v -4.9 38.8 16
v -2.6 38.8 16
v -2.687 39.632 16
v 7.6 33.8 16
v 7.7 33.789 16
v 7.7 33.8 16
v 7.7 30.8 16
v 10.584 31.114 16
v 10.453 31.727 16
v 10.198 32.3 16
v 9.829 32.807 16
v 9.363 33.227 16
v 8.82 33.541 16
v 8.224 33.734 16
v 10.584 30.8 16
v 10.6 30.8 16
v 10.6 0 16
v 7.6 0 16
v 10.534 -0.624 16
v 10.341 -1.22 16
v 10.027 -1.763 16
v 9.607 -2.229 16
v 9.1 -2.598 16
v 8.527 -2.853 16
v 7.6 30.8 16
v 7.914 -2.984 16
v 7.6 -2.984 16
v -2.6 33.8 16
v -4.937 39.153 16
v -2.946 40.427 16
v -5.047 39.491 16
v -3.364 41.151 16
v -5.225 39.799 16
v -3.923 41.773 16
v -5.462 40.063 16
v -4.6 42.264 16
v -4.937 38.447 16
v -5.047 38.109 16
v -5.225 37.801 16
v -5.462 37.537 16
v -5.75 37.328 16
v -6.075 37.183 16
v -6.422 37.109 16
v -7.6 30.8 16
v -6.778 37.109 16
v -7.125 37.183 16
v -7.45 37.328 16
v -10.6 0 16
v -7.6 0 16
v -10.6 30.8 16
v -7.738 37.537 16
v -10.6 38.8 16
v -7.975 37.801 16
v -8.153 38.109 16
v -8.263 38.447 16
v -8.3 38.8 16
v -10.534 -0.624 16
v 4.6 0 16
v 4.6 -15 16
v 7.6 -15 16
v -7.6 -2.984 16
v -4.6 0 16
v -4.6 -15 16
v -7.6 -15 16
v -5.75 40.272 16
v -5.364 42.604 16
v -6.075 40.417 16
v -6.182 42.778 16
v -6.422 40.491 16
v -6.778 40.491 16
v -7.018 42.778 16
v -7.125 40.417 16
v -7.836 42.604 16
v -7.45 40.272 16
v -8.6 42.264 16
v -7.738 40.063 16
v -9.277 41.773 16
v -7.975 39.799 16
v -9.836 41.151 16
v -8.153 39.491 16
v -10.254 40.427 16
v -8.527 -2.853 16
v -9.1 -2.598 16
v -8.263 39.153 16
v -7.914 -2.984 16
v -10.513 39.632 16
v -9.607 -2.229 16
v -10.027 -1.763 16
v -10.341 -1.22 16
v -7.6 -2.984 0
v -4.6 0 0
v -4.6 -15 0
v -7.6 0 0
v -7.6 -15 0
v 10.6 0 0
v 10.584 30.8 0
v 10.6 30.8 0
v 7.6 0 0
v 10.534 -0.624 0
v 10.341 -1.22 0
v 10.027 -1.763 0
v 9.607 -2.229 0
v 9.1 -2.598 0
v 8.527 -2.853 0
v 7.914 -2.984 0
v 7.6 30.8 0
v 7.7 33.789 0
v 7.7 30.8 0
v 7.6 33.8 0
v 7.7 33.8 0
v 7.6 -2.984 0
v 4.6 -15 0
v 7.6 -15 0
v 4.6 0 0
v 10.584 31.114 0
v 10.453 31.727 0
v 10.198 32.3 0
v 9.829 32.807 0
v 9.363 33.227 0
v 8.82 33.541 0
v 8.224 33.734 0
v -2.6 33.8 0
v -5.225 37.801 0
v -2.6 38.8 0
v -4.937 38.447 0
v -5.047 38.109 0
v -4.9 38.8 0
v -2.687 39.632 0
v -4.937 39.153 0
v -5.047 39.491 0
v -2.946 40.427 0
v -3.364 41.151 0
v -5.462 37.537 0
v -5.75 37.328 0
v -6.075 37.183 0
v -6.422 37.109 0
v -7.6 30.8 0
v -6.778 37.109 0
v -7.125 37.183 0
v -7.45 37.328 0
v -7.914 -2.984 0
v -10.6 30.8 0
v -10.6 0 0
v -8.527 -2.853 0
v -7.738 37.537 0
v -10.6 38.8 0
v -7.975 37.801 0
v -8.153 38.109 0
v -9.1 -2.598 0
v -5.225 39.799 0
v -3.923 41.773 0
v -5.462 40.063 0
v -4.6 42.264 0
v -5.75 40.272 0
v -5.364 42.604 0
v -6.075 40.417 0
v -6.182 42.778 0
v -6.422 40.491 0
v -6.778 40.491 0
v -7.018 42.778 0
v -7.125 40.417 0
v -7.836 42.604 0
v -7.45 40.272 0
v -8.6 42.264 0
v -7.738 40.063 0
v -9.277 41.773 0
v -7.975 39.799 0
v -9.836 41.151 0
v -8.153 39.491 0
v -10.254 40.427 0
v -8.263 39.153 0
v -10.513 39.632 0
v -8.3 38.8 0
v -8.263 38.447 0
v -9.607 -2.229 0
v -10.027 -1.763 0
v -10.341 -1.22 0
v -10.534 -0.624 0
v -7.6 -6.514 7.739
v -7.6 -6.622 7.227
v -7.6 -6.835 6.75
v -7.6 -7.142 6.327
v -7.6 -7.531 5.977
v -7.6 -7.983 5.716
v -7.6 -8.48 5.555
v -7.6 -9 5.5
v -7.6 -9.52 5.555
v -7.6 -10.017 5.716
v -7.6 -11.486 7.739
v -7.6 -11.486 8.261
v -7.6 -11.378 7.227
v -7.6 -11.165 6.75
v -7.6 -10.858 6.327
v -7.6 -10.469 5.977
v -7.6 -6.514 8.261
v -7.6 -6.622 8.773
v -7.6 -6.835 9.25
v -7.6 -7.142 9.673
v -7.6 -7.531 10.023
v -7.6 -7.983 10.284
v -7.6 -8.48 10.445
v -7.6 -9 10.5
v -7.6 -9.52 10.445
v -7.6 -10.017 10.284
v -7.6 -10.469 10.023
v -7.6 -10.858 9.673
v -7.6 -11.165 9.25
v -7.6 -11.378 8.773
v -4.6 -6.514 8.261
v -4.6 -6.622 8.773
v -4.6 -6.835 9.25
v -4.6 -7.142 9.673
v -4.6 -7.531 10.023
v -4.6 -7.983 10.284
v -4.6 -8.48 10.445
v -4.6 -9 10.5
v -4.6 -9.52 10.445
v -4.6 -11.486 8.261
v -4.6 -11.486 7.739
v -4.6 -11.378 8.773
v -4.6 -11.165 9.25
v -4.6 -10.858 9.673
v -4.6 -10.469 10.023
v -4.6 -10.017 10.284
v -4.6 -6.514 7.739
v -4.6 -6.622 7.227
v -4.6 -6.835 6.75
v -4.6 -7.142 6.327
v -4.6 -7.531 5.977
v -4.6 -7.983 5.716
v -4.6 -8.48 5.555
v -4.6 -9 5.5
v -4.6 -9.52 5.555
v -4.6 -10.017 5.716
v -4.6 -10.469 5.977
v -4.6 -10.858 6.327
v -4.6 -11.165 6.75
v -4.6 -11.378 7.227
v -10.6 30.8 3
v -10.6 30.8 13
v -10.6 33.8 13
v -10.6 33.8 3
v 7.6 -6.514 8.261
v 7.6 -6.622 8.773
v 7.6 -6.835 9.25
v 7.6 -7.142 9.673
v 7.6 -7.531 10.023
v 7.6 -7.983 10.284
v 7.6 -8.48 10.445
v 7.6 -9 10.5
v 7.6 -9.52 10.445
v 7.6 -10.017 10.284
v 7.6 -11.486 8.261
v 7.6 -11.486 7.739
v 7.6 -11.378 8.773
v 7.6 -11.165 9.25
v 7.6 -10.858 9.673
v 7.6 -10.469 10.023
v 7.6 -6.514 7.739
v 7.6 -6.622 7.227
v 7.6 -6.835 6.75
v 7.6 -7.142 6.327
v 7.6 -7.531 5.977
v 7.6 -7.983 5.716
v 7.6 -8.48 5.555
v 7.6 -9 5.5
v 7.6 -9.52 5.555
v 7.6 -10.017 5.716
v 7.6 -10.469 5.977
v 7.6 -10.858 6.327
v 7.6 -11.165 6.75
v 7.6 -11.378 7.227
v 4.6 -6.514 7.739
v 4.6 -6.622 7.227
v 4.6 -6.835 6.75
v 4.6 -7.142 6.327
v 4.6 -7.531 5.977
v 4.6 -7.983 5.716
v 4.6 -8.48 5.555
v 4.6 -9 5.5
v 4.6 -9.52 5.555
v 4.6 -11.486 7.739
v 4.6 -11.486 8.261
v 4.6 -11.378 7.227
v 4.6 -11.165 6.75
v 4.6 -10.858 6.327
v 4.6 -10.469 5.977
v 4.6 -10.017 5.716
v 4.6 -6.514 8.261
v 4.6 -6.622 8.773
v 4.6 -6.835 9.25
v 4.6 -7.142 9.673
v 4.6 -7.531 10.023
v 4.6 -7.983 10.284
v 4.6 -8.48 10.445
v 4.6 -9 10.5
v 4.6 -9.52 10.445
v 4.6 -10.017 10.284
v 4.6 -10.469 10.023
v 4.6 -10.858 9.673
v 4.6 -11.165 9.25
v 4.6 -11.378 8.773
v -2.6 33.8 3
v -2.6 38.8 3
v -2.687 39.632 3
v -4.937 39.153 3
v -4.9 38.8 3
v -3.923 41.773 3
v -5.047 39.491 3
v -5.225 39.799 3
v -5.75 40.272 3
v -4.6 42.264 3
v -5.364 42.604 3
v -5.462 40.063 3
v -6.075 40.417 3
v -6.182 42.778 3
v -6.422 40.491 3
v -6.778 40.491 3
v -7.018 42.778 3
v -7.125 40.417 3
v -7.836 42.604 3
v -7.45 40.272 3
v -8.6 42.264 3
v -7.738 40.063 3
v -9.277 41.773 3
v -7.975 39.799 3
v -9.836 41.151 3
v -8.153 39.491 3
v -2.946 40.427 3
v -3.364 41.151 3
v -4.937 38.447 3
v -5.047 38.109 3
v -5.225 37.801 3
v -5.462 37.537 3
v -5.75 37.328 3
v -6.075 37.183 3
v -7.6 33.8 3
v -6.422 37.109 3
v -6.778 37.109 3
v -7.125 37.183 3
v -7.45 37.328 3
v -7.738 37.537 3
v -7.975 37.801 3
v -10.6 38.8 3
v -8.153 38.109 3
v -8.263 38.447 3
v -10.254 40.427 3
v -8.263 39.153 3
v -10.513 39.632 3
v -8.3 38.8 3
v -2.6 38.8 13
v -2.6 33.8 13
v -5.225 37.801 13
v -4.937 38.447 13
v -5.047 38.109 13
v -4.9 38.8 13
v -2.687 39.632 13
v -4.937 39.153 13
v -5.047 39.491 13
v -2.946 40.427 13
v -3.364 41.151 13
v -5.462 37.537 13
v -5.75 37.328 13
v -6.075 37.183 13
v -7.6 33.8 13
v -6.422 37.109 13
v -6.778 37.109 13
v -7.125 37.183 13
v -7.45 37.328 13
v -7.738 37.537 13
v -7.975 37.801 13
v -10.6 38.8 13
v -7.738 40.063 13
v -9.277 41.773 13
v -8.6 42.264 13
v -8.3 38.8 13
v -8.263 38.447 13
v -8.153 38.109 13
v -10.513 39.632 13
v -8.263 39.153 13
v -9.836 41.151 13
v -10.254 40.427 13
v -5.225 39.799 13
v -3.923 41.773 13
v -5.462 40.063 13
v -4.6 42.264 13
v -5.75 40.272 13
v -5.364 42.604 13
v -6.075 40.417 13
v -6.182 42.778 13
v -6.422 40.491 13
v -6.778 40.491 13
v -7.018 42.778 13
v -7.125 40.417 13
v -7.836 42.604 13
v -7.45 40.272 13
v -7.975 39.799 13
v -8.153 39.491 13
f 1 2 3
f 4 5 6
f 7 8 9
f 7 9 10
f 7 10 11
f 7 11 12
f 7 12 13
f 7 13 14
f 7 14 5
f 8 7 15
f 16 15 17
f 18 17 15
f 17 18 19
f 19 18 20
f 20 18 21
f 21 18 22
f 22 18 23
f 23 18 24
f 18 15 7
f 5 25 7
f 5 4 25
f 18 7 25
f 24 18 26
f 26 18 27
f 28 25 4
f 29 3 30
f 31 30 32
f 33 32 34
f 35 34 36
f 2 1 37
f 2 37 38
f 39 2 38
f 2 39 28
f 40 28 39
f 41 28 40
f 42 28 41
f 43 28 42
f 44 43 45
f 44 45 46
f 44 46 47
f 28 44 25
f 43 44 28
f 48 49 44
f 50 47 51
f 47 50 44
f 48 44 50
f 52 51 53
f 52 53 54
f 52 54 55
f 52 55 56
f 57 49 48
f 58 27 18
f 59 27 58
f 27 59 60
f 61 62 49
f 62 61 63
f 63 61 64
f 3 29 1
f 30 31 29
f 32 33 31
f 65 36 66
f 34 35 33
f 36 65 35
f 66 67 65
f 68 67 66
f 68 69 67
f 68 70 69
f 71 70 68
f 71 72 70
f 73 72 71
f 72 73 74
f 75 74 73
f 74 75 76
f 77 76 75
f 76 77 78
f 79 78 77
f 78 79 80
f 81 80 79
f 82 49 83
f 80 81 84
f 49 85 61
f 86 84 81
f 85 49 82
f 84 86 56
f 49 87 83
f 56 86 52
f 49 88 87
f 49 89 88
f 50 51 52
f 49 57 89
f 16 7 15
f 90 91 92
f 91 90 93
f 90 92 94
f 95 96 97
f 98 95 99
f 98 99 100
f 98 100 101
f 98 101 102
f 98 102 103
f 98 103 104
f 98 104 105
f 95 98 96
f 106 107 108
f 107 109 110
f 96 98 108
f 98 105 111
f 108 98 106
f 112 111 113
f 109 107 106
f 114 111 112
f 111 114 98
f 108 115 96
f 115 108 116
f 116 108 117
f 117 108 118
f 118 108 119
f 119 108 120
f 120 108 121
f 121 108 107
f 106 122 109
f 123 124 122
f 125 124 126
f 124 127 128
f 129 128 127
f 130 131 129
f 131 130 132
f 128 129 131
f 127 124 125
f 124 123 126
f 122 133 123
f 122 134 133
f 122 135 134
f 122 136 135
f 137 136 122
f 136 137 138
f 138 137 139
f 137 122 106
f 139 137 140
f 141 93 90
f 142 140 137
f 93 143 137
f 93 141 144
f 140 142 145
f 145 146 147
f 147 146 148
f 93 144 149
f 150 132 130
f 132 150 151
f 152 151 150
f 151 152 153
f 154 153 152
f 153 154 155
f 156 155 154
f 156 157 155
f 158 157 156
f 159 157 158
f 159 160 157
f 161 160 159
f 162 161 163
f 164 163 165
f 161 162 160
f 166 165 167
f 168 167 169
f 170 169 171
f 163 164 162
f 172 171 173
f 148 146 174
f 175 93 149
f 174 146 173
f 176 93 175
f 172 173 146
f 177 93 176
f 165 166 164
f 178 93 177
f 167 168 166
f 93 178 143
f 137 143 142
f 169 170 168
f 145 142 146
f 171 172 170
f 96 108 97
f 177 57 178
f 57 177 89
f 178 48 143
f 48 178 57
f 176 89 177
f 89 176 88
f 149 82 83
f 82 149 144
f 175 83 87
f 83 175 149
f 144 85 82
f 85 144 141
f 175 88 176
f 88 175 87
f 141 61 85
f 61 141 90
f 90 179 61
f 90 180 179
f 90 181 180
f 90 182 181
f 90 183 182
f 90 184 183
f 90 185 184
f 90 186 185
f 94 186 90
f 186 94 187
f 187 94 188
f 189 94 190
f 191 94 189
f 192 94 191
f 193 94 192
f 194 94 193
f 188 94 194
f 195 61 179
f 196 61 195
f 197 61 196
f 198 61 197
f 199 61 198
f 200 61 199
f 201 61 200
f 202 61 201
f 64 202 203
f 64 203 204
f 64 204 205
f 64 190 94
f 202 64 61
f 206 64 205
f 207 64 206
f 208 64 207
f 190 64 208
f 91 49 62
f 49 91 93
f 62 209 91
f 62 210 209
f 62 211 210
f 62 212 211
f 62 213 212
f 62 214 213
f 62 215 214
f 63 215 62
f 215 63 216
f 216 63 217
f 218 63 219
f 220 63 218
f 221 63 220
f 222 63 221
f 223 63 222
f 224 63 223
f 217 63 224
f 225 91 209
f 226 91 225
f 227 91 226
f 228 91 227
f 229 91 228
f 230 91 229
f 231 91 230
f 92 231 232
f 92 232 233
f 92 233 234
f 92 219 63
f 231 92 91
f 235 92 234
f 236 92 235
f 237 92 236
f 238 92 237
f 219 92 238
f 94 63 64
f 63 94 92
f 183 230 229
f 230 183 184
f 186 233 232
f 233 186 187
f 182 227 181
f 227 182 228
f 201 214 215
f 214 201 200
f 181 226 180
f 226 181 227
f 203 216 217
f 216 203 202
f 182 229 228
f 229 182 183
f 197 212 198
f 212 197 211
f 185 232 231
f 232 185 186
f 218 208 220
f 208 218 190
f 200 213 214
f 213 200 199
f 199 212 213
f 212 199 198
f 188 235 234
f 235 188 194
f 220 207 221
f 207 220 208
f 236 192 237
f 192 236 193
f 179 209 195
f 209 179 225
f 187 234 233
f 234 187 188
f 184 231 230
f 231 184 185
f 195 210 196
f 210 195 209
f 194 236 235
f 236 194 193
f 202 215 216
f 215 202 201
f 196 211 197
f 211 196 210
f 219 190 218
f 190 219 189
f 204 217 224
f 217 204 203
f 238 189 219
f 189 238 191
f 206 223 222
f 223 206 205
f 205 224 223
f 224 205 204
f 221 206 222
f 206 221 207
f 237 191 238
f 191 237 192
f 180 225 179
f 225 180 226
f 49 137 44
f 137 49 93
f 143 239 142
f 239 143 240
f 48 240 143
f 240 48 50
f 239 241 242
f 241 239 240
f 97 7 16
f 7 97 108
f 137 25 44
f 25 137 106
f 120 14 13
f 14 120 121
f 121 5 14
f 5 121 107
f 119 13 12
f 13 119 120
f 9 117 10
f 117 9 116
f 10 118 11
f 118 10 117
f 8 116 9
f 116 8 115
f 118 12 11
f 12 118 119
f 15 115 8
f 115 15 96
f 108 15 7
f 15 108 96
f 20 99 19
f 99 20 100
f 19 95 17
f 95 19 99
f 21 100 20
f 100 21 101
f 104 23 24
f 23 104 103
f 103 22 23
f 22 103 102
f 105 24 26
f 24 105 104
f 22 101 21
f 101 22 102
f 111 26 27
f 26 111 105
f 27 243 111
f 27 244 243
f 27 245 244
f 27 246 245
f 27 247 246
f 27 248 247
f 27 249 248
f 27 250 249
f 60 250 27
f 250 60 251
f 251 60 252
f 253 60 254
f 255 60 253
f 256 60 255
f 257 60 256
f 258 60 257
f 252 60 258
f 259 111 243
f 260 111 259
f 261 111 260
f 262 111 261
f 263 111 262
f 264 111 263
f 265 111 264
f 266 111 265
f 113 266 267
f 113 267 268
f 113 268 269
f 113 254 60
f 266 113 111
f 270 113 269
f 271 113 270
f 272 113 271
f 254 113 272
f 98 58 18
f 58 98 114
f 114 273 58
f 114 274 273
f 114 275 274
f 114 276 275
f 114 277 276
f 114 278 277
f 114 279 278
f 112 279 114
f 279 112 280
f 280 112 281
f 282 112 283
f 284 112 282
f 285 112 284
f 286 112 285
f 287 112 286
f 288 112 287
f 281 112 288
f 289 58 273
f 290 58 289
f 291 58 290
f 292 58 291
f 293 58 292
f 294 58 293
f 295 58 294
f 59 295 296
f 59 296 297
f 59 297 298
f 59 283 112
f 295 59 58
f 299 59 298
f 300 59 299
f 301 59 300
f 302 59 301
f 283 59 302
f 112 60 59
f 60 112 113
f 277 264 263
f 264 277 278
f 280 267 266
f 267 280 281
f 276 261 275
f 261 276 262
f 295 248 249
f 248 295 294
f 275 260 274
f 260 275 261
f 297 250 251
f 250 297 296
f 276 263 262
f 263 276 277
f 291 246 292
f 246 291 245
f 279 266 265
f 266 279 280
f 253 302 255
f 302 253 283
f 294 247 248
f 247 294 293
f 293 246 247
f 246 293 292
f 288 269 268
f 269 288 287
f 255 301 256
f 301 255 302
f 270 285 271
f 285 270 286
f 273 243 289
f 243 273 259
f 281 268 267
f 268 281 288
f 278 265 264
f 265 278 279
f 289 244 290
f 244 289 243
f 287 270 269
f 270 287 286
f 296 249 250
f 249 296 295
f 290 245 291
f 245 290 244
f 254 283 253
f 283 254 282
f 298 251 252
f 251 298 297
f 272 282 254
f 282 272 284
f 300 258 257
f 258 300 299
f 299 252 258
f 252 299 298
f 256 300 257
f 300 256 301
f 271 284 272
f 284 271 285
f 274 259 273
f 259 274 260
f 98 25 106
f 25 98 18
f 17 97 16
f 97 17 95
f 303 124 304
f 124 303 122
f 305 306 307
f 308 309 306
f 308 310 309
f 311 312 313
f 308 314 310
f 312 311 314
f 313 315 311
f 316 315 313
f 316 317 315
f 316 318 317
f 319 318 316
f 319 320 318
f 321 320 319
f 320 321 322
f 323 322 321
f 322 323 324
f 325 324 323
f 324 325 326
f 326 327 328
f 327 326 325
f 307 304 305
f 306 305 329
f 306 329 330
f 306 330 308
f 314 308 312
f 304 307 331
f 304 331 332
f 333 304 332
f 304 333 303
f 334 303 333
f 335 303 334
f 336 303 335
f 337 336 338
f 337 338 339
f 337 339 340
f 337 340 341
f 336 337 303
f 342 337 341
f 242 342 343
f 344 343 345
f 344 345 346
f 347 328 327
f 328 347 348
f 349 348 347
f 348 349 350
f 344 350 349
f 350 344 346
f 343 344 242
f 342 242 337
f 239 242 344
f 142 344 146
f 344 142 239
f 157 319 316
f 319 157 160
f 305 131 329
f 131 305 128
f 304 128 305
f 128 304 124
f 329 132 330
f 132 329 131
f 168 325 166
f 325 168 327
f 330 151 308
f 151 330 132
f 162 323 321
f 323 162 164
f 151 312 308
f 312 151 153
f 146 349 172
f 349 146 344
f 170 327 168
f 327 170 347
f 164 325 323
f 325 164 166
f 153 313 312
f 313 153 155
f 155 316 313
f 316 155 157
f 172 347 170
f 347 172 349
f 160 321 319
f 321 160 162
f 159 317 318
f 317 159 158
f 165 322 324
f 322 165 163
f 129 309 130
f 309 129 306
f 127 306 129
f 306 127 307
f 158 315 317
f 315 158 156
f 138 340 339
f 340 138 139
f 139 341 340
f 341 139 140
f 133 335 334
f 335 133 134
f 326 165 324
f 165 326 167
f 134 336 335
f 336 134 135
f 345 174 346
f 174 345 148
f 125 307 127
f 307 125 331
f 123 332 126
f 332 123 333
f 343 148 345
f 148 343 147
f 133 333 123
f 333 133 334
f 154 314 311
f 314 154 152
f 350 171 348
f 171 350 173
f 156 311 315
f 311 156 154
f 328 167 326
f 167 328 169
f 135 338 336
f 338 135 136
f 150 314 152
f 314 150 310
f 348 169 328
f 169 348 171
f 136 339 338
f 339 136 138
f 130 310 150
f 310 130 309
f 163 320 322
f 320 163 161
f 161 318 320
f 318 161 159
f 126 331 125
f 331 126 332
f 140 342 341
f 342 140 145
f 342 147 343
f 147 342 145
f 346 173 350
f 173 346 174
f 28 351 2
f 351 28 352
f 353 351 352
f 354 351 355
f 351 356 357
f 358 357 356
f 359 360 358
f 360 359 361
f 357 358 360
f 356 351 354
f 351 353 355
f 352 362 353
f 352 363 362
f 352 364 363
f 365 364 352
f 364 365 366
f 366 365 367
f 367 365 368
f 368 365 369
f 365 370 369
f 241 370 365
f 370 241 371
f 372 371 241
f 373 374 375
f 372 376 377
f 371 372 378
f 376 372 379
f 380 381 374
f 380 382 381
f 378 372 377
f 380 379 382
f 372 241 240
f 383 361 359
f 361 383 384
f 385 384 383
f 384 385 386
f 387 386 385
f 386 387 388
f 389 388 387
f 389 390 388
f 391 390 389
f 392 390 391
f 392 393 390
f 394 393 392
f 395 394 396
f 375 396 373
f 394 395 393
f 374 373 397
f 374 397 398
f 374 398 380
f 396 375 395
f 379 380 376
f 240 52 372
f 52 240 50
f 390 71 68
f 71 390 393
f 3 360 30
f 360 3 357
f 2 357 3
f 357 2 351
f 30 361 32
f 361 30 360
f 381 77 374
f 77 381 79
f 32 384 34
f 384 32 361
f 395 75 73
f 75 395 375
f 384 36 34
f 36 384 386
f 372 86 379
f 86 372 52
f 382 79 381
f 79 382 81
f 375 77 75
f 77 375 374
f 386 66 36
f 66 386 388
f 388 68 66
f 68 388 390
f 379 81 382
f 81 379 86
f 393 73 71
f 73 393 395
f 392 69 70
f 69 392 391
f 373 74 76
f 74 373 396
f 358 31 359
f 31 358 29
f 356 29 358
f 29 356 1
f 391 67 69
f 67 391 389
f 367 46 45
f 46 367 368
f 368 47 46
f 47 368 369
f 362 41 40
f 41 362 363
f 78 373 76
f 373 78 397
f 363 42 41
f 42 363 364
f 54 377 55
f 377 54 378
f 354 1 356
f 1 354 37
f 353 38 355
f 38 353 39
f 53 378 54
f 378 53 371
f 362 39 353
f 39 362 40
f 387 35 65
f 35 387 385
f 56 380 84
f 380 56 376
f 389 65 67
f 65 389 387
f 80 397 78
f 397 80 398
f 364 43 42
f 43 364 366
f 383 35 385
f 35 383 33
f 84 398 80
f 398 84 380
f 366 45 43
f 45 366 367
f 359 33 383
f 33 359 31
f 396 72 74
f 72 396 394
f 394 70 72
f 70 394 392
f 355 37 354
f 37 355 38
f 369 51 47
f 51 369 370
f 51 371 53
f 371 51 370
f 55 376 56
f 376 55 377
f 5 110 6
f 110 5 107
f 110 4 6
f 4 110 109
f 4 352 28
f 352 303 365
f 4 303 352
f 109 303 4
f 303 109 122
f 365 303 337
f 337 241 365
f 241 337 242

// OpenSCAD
// file: config.scad
/**
 * Глобальный конфигурационный файл
 */
// качество цилиндров
$fn=30;

// избегание совпадения граней
DELTA=0.1;

// толщина рамы
FRAME=15;
// main file
include <config.scad>

// диаметр поперечного отверстия
d3=5;

// боковая деталь - стенка
// длина (толщина)
x2=3;
// ширина
y2=30.8;
// высота
z2=16;
// расстояние от центра
x3=FRAME/2+0.1+x2;
// ширина хвостовой части
y3=15;

// ушко
// радиус закругления
r1=4;
// радиус отверстия
r2=3.4/2;
// длина
x1=2*r1;
// ширина
y1=8;
// высота
z1=3;

DELTA=0.1;
module quarter() {
intersection() {
    cylinder(r=x2, h=z2);
    cube([x2,x2,z2]);
}
}

module hpart_bottom() {
    translate([-x3,0,0])cube([x2,y2,z2]);
    translate([-x3+x2,y2,0])rotate([0,0,90])quarter();
    translate([-x3+x2,0,0])rotate([0,0,180])quarter();
    translate([-x3+x2,-y3,0])difference() {
        cube([x2,y3,z2]);
        translate([-DELTA,(y3-x2)/2,z2/2])rotate([0,90,0])cylinder(r=d3/2, h=x3);
    }
}

module ear() {
    difference() {
        union() {
            cube([x1,y1,z1]);
            translate([r1,y1,0])cylinder(r=r1,h=z1);
        }
        translate([r1,y1,-DELTA])cylinder(r=r2,h=z1+DELTA*2);
    }
}

module holder_part05() {
    hpart_bottom();
    mirror([1,0,0]) hpart_bottom();
    translate([-x3+x2-DELTA,y2,0])cube([(x3-x2)*2+DELTA*2,x2,z2]);

    translate([-x3,y2,0]) ear();
    translate([-x3,y2,z2-z1]) ear();
    translate([-x3,y2,0]) cube([x2,x2,z2]);
}

holder_part05();
